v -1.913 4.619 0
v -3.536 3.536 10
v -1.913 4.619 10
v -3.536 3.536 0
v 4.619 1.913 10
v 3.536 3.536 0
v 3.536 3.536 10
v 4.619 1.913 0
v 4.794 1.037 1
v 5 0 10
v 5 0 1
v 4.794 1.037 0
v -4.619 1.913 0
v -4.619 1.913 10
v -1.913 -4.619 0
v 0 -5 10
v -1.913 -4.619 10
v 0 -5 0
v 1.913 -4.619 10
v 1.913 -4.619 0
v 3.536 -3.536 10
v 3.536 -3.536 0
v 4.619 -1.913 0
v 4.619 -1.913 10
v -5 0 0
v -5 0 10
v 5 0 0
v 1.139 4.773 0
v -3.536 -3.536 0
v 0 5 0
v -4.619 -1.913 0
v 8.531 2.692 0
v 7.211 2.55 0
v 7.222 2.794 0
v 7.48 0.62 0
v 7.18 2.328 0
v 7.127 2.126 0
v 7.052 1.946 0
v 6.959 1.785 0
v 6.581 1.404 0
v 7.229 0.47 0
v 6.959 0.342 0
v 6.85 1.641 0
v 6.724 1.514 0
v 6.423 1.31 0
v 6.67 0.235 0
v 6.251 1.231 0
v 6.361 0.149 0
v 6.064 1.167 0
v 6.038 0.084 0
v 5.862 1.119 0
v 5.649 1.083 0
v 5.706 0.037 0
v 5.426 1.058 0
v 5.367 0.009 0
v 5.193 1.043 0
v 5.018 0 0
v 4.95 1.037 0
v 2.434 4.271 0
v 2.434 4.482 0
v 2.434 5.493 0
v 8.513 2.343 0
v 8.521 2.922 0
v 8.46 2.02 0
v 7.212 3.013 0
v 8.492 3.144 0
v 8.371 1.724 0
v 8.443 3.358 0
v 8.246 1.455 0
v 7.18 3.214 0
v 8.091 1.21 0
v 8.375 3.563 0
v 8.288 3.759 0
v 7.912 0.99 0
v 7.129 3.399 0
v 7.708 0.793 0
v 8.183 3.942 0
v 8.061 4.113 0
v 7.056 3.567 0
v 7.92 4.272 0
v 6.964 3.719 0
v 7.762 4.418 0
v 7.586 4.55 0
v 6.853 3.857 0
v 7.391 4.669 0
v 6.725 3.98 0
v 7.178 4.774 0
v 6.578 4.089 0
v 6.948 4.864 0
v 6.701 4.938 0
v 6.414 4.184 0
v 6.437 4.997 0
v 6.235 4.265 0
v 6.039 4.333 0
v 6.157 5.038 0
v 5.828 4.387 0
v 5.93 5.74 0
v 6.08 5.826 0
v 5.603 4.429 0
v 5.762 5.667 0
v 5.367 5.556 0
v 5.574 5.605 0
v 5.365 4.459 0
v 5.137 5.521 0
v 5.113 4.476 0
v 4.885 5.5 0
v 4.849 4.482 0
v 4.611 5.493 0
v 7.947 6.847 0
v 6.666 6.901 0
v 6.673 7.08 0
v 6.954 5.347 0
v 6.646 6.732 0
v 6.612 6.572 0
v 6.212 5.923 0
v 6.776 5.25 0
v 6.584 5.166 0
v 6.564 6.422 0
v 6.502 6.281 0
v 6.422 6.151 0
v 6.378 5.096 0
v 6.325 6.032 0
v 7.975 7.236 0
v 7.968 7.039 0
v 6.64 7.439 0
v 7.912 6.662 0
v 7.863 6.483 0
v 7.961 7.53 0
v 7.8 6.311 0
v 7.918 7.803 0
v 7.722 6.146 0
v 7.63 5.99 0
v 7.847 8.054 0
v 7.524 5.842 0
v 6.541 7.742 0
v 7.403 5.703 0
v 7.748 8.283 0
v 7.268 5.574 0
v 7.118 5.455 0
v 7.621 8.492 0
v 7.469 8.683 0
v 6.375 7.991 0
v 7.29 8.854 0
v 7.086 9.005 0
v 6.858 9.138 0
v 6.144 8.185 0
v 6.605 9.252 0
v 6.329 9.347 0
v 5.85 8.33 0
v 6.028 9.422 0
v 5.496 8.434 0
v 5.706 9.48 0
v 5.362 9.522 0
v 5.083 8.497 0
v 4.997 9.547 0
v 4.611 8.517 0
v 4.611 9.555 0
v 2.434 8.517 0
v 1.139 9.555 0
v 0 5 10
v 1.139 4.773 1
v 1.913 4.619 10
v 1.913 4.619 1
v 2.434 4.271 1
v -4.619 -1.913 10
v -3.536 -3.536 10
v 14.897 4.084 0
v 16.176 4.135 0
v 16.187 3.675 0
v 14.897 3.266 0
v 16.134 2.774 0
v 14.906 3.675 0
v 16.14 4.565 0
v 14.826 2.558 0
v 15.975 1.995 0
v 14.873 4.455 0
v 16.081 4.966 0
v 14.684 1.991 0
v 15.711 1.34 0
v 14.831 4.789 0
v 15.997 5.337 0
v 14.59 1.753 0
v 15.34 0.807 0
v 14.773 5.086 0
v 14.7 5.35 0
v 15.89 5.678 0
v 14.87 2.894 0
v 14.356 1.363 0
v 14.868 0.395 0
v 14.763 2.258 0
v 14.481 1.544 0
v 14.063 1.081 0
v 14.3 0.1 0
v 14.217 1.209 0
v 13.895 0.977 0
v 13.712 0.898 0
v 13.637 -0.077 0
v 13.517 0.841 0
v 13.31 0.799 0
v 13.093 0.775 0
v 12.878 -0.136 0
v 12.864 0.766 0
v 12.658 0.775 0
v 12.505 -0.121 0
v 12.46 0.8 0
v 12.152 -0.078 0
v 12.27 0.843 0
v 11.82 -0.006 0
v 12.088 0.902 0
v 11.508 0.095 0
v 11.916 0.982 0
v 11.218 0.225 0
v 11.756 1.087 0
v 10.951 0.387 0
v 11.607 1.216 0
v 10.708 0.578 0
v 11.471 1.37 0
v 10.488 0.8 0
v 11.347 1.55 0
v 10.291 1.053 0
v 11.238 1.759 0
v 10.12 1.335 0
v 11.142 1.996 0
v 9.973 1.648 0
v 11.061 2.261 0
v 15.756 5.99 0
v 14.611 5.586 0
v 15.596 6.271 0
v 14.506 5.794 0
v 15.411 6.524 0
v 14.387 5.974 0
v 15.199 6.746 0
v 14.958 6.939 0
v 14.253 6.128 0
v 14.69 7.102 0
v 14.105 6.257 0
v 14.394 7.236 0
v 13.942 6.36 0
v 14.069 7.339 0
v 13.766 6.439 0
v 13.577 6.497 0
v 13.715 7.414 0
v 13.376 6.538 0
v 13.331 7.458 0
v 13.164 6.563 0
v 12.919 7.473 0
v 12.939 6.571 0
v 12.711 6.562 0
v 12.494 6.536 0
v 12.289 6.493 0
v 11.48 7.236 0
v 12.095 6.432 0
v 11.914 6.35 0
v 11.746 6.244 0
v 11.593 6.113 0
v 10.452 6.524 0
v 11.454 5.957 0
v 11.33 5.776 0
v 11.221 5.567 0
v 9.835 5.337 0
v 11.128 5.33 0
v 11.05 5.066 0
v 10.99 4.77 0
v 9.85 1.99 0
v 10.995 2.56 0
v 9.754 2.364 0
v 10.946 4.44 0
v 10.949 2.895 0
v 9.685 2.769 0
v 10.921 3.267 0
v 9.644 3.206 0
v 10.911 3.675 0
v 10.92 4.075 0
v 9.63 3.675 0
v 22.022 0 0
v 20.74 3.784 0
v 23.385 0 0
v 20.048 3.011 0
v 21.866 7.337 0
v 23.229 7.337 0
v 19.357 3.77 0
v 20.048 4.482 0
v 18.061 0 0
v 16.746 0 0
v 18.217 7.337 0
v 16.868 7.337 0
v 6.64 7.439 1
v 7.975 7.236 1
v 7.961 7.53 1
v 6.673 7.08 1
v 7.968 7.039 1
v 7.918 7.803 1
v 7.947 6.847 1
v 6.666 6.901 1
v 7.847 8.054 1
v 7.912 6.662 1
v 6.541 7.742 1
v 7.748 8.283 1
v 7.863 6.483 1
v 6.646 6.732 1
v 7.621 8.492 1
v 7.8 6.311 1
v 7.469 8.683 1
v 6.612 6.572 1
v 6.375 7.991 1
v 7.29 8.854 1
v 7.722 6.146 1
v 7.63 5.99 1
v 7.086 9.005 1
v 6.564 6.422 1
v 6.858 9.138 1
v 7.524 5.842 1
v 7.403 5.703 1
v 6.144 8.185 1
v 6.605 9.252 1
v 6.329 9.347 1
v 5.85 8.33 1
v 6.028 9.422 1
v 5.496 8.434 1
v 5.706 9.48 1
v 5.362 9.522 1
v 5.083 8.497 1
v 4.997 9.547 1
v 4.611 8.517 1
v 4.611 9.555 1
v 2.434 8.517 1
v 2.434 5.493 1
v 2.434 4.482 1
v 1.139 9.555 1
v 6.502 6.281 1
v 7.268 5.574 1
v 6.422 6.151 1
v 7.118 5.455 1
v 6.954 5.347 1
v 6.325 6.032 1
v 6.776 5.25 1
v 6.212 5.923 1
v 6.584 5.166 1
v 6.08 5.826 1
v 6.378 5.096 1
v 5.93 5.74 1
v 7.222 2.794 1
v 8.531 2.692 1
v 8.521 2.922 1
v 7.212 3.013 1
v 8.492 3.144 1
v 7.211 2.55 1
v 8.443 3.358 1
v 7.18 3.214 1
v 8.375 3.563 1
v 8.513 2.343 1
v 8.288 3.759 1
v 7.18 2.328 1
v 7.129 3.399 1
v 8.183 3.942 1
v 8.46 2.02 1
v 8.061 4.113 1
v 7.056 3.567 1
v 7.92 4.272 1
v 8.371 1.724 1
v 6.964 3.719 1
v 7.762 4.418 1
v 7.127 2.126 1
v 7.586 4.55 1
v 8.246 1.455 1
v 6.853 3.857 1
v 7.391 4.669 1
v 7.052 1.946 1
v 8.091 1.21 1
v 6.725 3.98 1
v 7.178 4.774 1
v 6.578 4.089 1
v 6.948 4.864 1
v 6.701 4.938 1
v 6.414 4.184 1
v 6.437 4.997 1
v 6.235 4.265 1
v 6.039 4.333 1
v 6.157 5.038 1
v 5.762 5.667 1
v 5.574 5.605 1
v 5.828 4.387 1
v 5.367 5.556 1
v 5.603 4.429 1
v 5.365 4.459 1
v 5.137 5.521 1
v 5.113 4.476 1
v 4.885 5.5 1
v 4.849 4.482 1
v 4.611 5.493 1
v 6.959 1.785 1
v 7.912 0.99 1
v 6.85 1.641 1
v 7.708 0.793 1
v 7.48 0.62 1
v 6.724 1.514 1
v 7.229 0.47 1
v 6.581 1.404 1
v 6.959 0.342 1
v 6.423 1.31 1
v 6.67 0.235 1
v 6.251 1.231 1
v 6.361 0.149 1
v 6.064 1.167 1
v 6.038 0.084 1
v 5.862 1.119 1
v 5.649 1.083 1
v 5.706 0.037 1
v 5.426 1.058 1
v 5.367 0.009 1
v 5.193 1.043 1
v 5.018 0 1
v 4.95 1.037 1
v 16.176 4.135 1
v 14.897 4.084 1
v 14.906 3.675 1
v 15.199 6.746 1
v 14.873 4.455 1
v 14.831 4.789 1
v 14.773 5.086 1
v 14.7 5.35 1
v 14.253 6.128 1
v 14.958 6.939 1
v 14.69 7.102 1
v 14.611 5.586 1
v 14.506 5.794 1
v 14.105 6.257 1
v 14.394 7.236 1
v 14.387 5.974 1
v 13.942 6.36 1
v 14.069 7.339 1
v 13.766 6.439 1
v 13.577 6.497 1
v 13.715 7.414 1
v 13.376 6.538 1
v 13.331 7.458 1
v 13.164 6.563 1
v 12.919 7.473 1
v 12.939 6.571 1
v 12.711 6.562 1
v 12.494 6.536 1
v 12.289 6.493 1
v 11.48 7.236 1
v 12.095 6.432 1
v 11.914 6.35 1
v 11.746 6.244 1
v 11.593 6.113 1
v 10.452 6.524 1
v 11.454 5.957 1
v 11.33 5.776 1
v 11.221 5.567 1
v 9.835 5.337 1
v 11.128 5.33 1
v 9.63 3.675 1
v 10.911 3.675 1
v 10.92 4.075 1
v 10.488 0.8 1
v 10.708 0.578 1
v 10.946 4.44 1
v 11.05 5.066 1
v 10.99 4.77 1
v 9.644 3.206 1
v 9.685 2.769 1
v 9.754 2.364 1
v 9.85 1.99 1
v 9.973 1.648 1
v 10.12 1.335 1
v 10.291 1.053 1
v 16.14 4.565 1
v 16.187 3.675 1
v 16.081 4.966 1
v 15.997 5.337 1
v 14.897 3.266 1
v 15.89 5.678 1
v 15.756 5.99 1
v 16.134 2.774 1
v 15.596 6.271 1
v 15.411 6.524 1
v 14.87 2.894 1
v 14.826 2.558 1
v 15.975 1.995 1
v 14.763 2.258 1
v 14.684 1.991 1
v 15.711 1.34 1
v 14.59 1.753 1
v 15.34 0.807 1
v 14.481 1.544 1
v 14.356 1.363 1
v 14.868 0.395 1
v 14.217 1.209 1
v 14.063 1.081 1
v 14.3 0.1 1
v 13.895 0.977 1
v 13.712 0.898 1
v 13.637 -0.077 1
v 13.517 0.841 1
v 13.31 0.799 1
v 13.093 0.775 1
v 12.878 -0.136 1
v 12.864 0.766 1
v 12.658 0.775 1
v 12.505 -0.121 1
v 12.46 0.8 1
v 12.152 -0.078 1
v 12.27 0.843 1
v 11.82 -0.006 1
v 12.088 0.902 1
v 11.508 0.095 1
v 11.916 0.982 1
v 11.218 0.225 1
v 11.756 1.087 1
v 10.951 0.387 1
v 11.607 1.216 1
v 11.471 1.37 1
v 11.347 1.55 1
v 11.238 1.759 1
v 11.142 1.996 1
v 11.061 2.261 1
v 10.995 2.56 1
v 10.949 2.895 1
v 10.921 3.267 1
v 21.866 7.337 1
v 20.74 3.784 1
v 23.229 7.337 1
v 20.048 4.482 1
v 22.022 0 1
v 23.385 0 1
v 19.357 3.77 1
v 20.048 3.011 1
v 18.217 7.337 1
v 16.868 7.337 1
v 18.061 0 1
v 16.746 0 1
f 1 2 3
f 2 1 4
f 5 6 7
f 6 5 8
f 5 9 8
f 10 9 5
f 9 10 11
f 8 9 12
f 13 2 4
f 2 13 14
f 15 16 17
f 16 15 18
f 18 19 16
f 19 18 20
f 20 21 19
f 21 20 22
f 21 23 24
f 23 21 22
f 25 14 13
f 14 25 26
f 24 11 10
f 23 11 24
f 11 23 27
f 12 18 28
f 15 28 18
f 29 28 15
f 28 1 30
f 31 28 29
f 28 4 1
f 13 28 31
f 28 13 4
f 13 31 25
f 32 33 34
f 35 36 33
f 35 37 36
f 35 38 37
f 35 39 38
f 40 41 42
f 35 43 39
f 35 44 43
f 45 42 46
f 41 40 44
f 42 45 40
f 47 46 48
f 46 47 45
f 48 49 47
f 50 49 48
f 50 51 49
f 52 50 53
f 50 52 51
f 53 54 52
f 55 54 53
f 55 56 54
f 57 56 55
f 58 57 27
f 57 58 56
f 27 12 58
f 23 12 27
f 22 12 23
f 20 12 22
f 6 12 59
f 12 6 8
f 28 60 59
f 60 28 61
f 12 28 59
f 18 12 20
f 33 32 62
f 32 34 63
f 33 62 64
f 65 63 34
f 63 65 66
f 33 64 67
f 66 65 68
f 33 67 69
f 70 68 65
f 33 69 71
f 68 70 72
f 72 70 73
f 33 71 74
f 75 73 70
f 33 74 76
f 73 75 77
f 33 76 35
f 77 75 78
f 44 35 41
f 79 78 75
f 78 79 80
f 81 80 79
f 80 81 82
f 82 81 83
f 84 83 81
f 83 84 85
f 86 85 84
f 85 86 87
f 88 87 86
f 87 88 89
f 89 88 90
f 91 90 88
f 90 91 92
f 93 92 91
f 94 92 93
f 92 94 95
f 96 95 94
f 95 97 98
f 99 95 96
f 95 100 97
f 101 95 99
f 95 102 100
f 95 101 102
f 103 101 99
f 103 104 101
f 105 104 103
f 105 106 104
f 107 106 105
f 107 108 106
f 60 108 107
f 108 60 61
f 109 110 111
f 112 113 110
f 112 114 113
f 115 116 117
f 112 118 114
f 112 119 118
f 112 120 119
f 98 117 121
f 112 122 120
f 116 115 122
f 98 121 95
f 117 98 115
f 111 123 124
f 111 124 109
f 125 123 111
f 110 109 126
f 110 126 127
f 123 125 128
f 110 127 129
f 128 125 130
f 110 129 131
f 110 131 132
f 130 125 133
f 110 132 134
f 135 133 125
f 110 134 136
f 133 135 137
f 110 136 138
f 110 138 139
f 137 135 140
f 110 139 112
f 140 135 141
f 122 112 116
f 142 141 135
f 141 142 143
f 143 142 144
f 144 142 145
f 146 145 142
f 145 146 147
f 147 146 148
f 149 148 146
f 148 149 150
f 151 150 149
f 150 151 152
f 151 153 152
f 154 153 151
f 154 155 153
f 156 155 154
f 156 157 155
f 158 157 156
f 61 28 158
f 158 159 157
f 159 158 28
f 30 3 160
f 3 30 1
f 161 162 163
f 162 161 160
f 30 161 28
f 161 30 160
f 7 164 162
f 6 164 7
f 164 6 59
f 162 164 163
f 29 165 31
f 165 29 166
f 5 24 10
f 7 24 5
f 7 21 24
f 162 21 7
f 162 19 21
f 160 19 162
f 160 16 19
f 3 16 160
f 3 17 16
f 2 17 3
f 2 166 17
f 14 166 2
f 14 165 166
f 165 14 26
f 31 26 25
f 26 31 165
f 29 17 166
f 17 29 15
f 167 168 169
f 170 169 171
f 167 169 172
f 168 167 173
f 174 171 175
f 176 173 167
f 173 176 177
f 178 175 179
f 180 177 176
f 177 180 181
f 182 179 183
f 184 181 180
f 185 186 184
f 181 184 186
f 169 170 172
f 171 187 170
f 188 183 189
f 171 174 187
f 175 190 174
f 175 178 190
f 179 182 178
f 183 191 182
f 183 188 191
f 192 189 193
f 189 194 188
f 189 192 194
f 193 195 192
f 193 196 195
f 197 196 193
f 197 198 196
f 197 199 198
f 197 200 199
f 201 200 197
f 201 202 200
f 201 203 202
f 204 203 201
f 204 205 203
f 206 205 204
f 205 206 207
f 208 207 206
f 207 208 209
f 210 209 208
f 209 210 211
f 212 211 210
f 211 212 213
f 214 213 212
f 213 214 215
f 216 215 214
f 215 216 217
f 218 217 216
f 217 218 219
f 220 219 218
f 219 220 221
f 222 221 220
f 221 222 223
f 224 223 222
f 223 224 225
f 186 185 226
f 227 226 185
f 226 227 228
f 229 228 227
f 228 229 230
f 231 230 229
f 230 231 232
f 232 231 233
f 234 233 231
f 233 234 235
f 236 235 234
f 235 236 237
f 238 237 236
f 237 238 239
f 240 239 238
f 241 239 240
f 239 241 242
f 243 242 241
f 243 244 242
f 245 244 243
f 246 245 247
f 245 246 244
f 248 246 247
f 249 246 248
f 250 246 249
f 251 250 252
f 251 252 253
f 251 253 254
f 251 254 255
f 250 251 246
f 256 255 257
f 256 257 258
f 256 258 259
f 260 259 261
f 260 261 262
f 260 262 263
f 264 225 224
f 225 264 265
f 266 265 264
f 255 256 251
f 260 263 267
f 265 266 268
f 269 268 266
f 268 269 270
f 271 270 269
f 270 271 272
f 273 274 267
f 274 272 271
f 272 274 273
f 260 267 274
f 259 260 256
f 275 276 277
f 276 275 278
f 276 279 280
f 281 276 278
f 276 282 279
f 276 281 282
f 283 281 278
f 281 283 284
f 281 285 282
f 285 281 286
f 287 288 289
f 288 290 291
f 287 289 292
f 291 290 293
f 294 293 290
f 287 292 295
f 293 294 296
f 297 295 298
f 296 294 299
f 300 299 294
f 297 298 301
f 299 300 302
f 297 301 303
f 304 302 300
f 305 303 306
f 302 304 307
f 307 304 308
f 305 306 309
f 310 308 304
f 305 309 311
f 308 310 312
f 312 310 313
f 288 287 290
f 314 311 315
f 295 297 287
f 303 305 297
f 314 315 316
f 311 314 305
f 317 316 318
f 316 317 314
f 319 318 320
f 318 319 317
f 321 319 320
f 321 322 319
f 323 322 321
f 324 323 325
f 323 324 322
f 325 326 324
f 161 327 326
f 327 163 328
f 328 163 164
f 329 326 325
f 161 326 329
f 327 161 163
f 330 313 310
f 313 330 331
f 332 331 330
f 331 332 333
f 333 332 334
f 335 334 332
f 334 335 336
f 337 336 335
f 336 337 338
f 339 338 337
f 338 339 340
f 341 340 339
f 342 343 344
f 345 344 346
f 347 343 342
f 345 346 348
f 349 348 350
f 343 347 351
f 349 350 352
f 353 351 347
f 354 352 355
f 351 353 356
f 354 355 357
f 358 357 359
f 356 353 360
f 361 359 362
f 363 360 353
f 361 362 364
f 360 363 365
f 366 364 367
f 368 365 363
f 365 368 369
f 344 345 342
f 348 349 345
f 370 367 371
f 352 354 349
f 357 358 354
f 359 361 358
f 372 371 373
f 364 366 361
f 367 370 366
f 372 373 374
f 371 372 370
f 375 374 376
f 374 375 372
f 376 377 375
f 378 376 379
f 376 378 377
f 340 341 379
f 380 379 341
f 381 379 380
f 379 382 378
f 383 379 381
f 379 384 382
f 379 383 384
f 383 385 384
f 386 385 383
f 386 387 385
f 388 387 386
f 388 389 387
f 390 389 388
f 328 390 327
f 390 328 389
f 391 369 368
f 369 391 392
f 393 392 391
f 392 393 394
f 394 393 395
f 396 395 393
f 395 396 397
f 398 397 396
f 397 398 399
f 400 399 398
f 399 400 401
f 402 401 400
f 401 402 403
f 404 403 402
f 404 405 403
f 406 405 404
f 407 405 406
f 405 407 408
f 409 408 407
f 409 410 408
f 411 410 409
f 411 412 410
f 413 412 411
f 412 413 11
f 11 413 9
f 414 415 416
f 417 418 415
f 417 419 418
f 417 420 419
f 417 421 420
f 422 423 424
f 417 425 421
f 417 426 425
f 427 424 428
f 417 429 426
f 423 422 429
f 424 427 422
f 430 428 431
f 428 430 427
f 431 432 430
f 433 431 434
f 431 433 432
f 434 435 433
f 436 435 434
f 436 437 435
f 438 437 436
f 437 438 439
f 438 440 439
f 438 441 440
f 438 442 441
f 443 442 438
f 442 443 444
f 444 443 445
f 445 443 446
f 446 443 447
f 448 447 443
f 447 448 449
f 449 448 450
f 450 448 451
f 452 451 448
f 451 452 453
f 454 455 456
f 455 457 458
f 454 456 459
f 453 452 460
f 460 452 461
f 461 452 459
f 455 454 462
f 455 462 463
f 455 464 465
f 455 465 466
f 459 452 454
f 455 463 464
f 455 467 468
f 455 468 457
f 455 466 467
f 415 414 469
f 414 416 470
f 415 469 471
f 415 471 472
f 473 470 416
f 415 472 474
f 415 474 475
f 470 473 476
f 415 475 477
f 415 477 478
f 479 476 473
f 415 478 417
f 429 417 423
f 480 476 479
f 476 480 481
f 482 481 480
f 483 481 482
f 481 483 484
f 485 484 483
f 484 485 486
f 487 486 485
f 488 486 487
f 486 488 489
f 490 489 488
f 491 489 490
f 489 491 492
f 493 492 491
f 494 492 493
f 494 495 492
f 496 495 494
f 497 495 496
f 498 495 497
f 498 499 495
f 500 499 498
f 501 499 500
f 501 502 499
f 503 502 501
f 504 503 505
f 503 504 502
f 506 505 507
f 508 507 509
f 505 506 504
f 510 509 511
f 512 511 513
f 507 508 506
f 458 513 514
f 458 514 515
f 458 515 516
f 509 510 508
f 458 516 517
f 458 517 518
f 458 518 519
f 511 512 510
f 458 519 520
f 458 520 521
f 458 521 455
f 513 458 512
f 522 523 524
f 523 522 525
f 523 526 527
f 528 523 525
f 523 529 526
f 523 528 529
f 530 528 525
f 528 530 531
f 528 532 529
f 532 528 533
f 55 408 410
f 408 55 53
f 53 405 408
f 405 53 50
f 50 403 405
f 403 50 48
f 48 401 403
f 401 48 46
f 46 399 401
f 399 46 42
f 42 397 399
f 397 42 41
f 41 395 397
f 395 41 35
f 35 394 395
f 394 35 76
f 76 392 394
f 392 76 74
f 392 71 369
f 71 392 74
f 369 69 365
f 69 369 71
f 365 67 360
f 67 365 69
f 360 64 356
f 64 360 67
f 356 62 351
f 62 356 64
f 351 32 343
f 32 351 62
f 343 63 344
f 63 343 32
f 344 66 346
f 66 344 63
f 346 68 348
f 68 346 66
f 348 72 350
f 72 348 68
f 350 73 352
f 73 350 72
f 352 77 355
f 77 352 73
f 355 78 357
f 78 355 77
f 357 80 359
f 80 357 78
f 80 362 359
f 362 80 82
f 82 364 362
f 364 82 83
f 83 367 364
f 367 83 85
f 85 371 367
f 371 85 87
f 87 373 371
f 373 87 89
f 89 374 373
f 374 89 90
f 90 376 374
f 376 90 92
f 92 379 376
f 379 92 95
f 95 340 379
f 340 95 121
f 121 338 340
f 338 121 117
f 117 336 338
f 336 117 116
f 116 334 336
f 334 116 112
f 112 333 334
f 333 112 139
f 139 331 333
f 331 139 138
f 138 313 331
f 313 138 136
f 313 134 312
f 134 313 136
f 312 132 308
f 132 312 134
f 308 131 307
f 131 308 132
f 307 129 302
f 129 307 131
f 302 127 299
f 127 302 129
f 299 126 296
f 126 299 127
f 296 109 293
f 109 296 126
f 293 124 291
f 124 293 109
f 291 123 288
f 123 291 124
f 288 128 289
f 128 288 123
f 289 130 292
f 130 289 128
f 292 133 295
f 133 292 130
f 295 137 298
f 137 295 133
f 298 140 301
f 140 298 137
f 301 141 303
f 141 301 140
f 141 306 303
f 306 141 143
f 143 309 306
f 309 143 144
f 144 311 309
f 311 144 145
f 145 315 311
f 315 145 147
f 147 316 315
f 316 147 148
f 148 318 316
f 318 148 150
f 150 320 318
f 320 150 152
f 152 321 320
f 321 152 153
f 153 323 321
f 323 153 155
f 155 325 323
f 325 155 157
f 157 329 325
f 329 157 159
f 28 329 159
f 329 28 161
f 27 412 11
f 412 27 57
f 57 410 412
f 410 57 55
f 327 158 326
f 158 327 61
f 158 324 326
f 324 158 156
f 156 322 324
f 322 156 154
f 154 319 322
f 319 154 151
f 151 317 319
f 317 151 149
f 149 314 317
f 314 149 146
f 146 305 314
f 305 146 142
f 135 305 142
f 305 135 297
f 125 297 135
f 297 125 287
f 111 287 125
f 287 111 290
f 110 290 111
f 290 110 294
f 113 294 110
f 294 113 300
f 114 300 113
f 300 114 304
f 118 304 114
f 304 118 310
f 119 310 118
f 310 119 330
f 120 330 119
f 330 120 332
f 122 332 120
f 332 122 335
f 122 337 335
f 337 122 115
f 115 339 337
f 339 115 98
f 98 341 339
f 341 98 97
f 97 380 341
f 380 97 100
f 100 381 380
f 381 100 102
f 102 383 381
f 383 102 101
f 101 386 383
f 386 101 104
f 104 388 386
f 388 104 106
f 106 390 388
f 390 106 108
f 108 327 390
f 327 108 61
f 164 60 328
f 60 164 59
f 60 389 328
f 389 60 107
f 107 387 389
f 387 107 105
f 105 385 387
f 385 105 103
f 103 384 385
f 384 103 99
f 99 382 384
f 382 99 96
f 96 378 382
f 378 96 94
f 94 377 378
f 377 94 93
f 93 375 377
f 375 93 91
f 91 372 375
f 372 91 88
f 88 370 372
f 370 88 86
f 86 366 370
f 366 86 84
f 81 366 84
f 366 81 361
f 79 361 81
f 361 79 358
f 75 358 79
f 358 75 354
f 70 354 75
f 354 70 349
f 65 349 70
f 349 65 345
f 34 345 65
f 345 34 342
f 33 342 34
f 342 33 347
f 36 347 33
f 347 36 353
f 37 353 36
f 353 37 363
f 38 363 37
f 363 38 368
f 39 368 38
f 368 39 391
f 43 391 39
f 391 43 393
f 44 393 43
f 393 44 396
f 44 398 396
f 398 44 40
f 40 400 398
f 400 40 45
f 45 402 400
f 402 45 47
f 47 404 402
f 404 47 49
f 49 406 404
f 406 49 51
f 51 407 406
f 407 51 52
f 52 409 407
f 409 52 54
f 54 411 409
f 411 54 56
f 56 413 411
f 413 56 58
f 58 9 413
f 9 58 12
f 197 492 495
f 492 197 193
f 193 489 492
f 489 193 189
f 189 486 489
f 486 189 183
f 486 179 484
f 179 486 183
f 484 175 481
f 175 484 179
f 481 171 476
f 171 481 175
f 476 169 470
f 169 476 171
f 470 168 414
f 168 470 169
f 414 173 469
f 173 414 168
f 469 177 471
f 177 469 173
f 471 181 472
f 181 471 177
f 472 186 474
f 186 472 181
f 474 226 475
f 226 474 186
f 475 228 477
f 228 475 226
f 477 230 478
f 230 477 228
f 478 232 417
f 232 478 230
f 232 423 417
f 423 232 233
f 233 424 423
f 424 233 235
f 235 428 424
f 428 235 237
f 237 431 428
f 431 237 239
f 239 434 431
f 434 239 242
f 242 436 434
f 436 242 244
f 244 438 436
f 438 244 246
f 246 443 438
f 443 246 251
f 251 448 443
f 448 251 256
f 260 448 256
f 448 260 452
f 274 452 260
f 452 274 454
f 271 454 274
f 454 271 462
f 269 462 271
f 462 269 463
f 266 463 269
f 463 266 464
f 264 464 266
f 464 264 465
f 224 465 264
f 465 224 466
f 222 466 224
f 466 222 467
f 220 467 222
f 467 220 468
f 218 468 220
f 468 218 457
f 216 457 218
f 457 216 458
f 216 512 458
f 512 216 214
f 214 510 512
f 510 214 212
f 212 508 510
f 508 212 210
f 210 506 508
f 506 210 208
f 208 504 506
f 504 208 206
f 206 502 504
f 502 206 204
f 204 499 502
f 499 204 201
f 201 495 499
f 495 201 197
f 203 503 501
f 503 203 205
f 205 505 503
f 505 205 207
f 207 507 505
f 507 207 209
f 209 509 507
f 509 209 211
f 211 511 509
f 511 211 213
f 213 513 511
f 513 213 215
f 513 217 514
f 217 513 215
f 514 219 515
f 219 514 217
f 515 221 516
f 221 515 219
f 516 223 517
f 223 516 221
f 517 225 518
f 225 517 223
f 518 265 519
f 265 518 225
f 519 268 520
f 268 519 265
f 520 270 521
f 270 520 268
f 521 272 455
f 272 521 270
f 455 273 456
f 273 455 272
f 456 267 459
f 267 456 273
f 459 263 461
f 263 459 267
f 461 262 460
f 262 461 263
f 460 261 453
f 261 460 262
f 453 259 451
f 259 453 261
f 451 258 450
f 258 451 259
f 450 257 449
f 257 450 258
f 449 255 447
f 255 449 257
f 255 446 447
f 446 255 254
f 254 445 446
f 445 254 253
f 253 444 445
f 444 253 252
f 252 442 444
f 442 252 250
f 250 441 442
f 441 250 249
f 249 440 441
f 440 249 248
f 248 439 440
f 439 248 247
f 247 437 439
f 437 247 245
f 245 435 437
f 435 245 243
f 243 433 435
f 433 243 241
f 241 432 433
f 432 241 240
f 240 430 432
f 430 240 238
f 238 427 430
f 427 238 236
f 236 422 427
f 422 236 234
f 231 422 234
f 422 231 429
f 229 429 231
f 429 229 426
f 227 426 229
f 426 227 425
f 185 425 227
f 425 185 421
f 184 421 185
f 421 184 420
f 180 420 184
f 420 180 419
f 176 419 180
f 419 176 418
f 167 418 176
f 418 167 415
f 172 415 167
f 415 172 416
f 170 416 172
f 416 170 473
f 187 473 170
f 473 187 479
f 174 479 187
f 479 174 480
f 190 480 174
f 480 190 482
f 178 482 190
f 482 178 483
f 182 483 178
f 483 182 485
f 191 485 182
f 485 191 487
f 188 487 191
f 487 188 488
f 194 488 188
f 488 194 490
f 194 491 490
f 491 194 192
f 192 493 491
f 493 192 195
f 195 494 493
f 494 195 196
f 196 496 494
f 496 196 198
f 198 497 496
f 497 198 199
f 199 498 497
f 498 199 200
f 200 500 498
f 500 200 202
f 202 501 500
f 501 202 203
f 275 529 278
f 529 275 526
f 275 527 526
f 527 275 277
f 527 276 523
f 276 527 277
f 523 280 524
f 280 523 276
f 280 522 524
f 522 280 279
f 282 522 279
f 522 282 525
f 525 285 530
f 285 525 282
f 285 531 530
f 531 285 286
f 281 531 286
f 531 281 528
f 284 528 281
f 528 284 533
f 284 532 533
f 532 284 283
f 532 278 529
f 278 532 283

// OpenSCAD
// The style is only named where it's compared: a drop-down of the three
style = "round";
label = "Box";
if (style == "square") cube(10);
else if (style == "hex") cylinder(d = 10, h = 10, $fn = 6);
else cylinder(d = 10, h = 10);
if (label != "") linear_extrude(1) text(label);
